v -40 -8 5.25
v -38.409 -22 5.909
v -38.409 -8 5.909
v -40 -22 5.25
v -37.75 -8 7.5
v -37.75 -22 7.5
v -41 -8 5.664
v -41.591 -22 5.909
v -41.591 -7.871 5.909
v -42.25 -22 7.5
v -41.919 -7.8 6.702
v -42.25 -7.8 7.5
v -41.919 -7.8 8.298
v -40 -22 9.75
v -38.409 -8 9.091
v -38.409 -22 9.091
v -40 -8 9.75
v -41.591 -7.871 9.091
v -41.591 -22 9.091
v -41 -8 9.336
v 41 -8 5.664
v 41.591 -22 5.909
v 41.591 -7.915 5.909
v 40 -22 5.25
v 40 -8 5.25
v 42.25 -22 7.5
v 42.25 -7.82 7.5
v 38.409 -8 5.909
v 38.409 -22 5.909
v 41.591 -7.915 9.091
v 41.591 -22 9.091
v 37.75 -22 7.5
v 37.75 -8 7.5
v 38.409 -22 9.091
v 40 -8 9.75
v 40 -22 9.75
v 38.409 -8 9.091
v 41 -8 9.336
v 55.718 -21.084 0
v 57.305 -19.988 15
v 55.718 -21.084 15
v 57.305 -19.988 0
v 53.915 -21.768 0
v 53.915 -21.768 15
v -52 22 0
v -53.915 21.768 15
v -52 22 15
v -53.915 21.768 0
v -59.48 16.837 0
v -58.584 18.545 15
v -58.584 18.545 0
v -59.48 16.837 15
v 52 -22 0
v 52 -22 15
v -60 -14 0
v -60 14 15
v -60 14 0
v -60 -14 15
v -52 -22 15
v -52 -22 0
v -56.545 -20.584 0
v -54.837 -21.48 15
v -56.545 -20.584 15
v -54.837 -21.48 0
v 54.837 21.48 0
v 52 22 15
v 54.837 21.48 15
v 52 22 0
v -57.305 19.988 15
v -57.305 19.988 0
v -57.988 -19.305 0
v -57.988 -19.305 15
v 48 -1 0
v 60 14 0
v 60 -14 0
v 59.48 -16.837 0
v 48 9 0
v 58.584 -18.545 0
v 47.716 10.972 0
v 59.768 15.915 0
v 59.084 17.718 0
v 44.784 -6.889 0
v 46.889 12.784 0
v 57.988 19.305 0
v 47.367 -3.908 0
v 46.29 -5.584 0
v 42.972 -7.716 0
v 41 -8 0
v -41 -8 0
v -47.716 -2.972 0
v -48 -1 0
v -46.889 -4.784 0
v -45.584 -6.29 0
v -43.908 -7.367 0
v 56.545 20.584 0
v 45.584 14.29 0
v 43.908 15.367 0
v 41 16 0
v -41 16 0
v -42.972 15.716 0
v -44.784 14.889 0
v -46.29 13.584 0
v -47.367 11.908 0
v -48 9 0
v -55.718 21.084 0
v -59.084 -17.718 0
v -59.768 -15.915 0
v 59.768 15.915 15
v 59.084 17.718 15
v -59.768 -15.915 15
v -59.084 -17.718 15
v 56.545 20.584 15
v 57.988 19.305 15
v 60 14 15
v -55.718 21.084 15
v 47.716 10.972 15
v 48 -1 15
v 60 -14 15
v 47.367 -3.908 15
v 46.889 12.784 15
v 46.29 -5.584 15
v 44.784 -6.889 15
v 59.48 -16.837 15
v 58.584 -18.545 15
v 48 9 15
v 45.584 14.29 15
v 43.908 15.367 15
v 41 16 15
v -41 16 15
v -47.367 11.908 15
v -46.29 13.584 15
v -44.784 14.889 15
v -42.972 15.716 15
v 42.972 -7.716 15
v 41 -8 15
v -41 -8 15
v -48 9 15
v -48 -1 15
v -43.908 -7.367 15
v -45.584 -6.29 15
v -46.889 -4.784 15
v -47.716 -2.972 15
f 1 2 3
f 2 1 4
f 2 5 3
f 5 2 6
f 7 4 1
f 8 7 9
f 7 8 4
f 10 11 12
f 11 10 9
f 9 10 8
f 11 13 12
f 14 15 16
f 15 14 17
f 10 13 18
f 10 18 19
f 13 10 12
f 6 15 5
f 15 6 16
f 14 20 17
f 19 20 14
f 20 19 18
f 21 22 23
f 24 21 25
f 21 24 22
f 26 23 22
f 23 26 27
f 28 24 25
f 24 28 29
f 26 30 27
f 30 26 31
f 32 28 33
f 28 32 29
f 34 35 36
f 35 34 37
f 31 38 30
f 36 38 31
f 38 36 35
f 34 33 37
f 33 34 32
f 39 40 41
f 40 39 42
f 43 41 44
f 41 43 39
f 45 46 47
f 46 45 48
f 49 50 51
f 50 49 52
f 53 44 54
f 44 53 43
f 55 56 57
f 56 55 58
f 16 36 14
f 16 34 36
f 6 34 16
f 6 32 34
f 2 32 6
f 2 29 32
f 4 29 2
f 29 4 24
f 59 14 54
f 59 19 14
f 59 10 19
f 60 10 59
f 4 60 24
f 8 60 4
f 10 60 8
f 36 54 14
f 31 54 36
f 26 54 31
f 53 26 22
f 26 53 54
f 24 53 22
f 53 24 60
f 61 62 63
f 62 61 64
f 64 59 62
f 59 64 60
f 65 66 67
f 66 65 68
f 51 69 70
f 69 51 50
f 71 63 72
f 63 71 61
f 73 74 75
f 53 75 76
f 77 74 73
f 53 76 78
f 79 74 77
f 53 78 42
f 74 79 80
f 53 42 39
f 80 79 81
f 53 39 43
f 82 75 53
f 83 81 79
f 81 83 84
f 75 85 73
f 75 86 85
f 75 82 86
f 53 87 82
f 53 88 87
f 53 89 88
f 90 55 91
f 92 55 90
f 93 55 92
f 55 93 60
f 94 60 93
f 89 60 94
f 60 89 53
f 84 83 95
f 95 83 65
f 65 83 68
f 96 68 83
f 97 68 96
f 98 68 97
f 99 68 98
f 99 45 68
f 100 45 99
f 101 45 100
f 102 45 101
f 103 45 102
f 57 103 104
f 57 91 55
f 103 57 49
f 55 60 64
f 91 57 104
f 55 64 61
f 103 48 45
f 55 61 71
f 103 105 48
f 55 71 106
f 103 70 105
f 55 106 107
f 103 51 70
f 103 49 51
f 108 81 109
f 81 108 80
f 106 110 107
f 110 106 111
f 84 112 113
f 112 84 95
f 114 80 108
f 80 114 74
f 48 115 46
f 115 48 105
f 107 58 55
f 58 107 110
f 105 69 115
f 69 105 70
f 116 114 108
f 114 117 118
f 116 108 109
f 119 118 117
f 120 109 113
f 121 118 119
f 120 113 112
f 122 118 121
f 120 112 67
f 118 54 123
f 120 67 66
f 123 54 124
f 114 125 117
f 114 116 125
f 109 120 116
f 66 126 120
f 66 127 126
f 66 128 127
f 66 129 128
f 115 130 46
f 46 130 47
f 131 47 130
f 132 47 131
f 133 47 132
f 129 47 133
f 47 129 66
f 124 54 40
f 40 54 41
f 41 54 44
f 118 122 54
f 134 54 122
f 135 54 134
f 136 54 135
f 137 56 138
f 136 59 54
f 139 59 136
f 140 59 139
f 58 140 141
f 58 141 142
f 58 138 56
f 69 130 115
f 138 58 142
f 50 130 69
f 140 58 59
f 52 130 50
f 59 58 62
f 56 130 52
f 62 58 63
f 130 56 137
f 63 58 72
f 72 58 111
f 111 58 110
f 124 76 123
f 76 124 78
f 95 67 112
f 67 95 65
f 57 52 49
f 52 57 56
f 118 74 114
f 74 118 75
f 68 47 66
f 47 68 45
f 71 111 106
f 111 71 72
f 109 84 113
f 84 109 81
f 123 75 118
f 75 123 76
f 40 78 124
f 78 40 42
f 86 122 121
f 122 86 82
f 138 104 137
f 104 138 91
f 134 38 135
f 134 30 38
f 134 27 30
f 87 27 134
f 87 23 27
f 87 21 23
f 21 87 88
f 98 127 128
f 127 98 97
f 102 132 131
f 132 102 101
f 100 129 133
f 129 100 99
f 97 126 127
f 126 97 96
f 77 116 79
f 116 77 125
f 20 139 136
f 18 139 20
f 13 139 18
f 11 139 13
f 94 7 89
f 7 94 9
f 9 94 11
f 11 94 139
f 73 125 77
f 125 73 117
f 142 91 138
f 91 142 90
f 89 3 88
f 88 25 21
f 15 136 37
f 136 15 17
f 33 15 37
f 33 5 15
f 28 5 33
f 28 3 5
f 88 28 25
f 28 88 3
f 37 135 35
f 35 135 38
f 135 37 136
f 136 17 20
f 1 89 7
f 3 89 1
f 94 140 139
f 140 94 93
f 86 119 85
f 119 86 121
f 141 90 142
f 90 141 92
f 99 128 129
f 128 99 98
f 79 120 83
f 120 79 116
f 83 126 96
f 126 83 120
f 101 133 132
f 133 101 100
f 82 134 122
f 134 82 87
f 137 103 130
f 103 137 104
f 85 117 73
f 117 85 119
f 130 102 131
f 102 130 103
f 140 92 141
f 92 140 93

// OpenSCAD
// file: frame_layout.scad
// AUTO-GENERATED by tools/boltframe.py — backer frame layout
// Board coords, z=0 at plate BACK, +z into the cavity.
fr_face=[410.0,550.0]; fr_clr=0.5; fr_wall=3.0; fr_cavity=48.0;
fr_panel_t=2.4; fr_flange_w=16.0; fr_flange_t=4.0;
fr_ledge_w=8.0; fr_ledge_t=4.0; fr_reveal=2.0;
fr_joint=[205.0,300.0];
fr_boss=[[12.00,6.00],[142.00,6.00],[272.00,6.00],[398.00,6.00],[12.00,544.00],[142.00,544.00],[272.00,544.00],[398.00,544.00],[6.00,130.00],[6.00,275.00],[6.00,420.00],[404.00,130.00],[404.00,275.00],[404.00,420.00]];
fr_panels=[[0.0,0.0,205.0,300.0],[205.0,0.0,410.0,300.0],[0.0,300.0,205.0,550.0],[205.0,300.0,410.0,550.0]];
fr_panel_scr=[[[60.00,3.50],[150.00,3.50],[3.50,120.00],[3.50,210.00],[131.50,60.00],[131.50,190.00],[174.50,60.00],[174.50,190.00],[40.00,255.00]],[[260.00,3.50],[350.00,3.50],[406.50,120.00],[406.50,210.00],[280.00,255.00],[370.00,255.00]],[[60.00,546.50],[150.00,546.50],[3.50,340.00],[3.50,395.00],[104.50,330.00],[104.50,470.00],[147.50,330.00],[147.50,470.00]],[[220.00,546.50],[260.00,546.50],[350.00,546.50],[406.50,340.00],[406.50,470.00],[406.50,530.00]]];
fr_ledge_boss=[[60.00,3.50],[150.00,3.50],[260.00,3.50],[350.00,3.50],[60.00,546.50],[150.00,546.50],[220.00,546.50],[260.00,546.50],[350.00,546.50],[3.50,120.00],[3.50,210.00],[3.50,340.00],[3.50,395.00],[406.50,120.00],[406.50,210.00],[406.50,340.00],[406.50,470.00],[406.50,530.00]];
fr_rail_boss=[[104.50,330.00],[104.50,470.00],[147.50,330.00],[147.50,470.00],[131.50,60.00],[131.50,190.00],[174.50,60.00],[174.50,190.00]];
fr_leg=[[40.00,255.00],[280.00,255.00],[370.00,255.00]];
fr_tray_psu=[1.0,407.0,98.0,536.0];
fr_psu_holes=[[35.00,485.00],[68.00,485.00]];
fr_psu_slots=[[41.50,427.50,46.50,427.50],[41.50,482.50,46.50,482.50]];
fr_tray_ctl=[342.0,405.0,392.0,534.0];
fr_ctl_holes=[[354.00,408.50],[380.00,530.50]];
fr_ctl_ext=[[99.00,12.40],[221.00,38.40]];
fr_gland=[275.0,19.0];
fr_gland_plate=0;
fr_trim=0;
fr_handle=[[60.0,150.0,65.0,145.0],[260.0,350.0,265.0,345.0]];
fr_feet=[105.0,305.0];
fr_vent_intake=[14, 23, 32, 41, 50];
fr_vent_exhaust=[500, 509, 518, 527, 536];
fr_mic=[367.0,470.0];
// main file
// Backer-frame small parts (spec 2026-07-21). WHITE PETG.
//   openscad -D PART=<n> [-D GLAND=<7|9|11>] [-D SEG=<1..4>] -o out.stl \
//       src/parts/frame_parts.scad
//   PART: 1=handle(x2) 2=foot(x2) 3=leg(x3) 4=gland plate 5=dovetail key(x4)
//         6=trim strip (per SEG, x4) 7=tray-pattern coupon (print FIRST)
include <frame_layout.scad>

PART = 1;
GLAND = 9;
SEG = 1;

module rrect(w, h, r) offset(r = r) offset(delta = -r)
    square([w, h], center = true);

// ---- 1: carry/hang handle — bolts M4 at 80 apart, back face flush ----
module handle() {
    difference() {
        linear_extrude(15) rrect(120, 44, 8);           // z = thickness (15)
        translate([0, 4, -0.1]) linear_extrude(15.2) rrect(96, 24, 7);
        // bolts run DOWN (-y) through the 14 mm base into the rail pads —
        // drive them from above, through the grip opening; head + washer
        // bear on the grip floor. Axis at mid-thickness (z 7.5) pairs with
        // the rail pilot at wz1 - 7.5 for an exactly back-flush mount.
        for (s = [-1, 1]) translate([s * 40, -22.1, 7.5]) rotate([-90, 0, 0])
            cylinder(h = 14.3, d = 4.5);
    }
}
// installed: the handle STANDS on the top rail's top face (grip up), its
// 15 mm thickness fore-aft, back face coplanar with the back panels.

// ---- 2: snap-in foot — arrowhead tab, blade 90 fore-aft ----
module foot() {
    translate([-12, -45, 0]) cube([24, 90, 6]);         // blade on the floor
    translate([-7, -1.5, 5.9]) cube([14, 3, 12.1]);     // tab riser
    difference() {
        union() {
            translate([-7, -1.5, 12]) cube([14, 3, 6]);
            for (s = [-1, 1])                            // barbs at the tips
                translate([s * 7, -1.5, 15]) scale([1, 1, 1]) hull() {
                    translate([s * -0.1, 0, 0]) cube([0.2, 3, 3]);
                    translate([s * 1.6, 0, 2.9]) cube([0.2, 3, 0.1]);
                }
        }
        translate([-1, -2, 10]) cube([2, 4, 8.2]);      // spring slit
    }
}

// ---- 3: leg for the S1/S2 sockets ----
module leg() {
    cylinder(h = 13, d = 10.0);                          // socket pin
    translate([0, 0, 13]) cylinder(h = 2, d = 14);       // shoulder on boss
    translate([0, 0, 15]) difference() {
        cylinder(h = fr_cavity - 15, d = 10);            // column to panel
        translate([0, 0, fr_cavity - 22.9]) cylinder(h = 8, d = 2.8);
    }
}

// ---- 4: gland plate (2.5 thick = PG clamp-safe seat) ----
gd = GLAND == 7 ? 12.5 : GLAND == 11 ? 18.6 : 15.2;
module gland_plate() difference() {
    linear_extrude(2.5) rrect(45, 30, 3);
    translate([0, 0, -0.1]) cylinder(h = 2.7, d = gd);
    for (s = [-1, 1]) translate([s * 20, 0, -0.1]) cylinder(h = 2.7, d = 3.4);
}

// ---- 5: dovetail key (KEEP IN SYNC with frame.scad bowtie) ----
module bowtie(cl = 0) {
    hull() { translate([-12 - cl, -7 - cl]) square([3 + cl, 14 + 2*cl]);
             translate([-1.5, -4 - cl]) square([3, 8 + 2*cl]); }
    hull() { translate([9, -7 - cl]) square([3 + cl, 14 + 2*cl]);
             translate([-1.5, -4 - cl]) square([3, 8 + 2*cl]); }
}
module key() difference() {
    linear_extrude(4) bowtie(0);
    for (s = [-1, 1]) translate([s * 8, 0, -0.1]) cylinder(h = 4.2, d = 2.4);
}

// ---- 6: snap-on trim strip (corner-L, per SEG like frame.scad) ----
ox0 = -fr_clr - fr_wall;  ox1 = fr_face[0] + fr_clr + fr_wall;
oy0 = -fr_clr - fr_wall;  oy1 = fr_face[1] + fr_clr + fr_wall;
module toring(grow, w) difference() {     // band outside->inboard, grown out
    translate([ox0 - grow, oy0 - grow])
        square([ox1 - ox0 + 2*grow, oy1 - oy0 + 2*grow]);
    translate([ox0 + w, oy0 + w])
        square([ox1 - ox0 - 2*w, oy1 - oy0 - 2*w]);
}
module trim_body() {
    // face leg: covers wall edge + clearance + 2 mm reveal onto the plate
    translate([0, 0, -3.6]) linear_extrude(1.6)
        toring(1.6, fr_wall + fr_clr + fr_reveal);
    // skirt down the outer face with an inward snap bead into the groove
    translate([0, 0, -3.6]) linear_extrude(11.6) toring(1.6, 0.01);
    translate([0, 0, 5.7]) linear_extrude(1.6) toring(0.01, 0.7);
}
clipx = [[ox0 - 2, fr_joint[0]], [fr_joint[0], ox1 + 2],
         [fr_joint[0], ox1 + 2], [ox0 - 2, fr_joint[0]]][SEG - 1];
clipy = [[oy0 - 2, fr_joint[1]], [oy0 - 2, fr_joint[1]],
         [fr_joint[1], oy1 + 2], [fr_joint[1], oy1 + 2]][SEG - 1];
module trim() rotate([180, 0, 0])          // face-leg down for printing
    translate([-clipx[0], -clipy[0], 0]) intersection() {
        trim_body();
        translate([clipx[0], clipy[0], -5])
            cube([clipx[1] - clipx[0], clipy[1] - clipy[0], 20]);
    }

// ---- 7: chirality coupon — verify BEFORE printing rails ----
// PSU pattern relative to the engraved case corner; Elite diagonals A and B
// from the marked center. Offer up to the physical units; whichever Elite
// diagonal matches sets ctl_diag in tools/boltframe.py.
module coupon() difference() {
    linear_extrude(1.2) translate([-5, -5]) square([110, 150]);
    // PSU: slots (LRS-50/75) + rounds (LRS-100), case corner at (0,0)
    for (l = [20.5, 75.5]) translate([0, 0, -0.1]) linear_extrude(1.4) hull() {
        translate([40.5, l]) circle(d = 3.2);
        translate([45.5, l]) circle(d = 3.2);
    }
    for (w = [34, 67]) translate([w, 78, -0.1]) cylinder(h = 1.4, d = 3.2);
    translate([0, 0, 0.6]) linear_extrude(0.7) {        // case edge engraves
        square([97, 0.8]); square([0.8, 129]);
        translate([81.6, 0]) square([0.8, 99]);          // LRS-50 width line
    }
    // Elite diagonals about center (48.5, 64.5): A = probed, B = mirror
    for (dm = [[1, "A", 10], [-1, "B", -22]]) {
        for (s = [-1, 1])
            translate([48.5 + s * 13 * dm[0], 64.5 + s * 61, -0.1])
                cylinder(h = 1.4, d = 4.6);
        translate([48.5 + dm[2], 64.5, 0.6]) linear_extrude(0.7)
            text(dm[1], size = 8, halign = "center", valign = "center");
    }
}

if (PART == 1) handle();
else if (PART == 2) foot();
else if (PART == 3) leg();
else if (PART == 4) gland_plate();
else if (PART == 5) key();
else if (PART == 6) trim();
else if (PART == 7) coupon();
